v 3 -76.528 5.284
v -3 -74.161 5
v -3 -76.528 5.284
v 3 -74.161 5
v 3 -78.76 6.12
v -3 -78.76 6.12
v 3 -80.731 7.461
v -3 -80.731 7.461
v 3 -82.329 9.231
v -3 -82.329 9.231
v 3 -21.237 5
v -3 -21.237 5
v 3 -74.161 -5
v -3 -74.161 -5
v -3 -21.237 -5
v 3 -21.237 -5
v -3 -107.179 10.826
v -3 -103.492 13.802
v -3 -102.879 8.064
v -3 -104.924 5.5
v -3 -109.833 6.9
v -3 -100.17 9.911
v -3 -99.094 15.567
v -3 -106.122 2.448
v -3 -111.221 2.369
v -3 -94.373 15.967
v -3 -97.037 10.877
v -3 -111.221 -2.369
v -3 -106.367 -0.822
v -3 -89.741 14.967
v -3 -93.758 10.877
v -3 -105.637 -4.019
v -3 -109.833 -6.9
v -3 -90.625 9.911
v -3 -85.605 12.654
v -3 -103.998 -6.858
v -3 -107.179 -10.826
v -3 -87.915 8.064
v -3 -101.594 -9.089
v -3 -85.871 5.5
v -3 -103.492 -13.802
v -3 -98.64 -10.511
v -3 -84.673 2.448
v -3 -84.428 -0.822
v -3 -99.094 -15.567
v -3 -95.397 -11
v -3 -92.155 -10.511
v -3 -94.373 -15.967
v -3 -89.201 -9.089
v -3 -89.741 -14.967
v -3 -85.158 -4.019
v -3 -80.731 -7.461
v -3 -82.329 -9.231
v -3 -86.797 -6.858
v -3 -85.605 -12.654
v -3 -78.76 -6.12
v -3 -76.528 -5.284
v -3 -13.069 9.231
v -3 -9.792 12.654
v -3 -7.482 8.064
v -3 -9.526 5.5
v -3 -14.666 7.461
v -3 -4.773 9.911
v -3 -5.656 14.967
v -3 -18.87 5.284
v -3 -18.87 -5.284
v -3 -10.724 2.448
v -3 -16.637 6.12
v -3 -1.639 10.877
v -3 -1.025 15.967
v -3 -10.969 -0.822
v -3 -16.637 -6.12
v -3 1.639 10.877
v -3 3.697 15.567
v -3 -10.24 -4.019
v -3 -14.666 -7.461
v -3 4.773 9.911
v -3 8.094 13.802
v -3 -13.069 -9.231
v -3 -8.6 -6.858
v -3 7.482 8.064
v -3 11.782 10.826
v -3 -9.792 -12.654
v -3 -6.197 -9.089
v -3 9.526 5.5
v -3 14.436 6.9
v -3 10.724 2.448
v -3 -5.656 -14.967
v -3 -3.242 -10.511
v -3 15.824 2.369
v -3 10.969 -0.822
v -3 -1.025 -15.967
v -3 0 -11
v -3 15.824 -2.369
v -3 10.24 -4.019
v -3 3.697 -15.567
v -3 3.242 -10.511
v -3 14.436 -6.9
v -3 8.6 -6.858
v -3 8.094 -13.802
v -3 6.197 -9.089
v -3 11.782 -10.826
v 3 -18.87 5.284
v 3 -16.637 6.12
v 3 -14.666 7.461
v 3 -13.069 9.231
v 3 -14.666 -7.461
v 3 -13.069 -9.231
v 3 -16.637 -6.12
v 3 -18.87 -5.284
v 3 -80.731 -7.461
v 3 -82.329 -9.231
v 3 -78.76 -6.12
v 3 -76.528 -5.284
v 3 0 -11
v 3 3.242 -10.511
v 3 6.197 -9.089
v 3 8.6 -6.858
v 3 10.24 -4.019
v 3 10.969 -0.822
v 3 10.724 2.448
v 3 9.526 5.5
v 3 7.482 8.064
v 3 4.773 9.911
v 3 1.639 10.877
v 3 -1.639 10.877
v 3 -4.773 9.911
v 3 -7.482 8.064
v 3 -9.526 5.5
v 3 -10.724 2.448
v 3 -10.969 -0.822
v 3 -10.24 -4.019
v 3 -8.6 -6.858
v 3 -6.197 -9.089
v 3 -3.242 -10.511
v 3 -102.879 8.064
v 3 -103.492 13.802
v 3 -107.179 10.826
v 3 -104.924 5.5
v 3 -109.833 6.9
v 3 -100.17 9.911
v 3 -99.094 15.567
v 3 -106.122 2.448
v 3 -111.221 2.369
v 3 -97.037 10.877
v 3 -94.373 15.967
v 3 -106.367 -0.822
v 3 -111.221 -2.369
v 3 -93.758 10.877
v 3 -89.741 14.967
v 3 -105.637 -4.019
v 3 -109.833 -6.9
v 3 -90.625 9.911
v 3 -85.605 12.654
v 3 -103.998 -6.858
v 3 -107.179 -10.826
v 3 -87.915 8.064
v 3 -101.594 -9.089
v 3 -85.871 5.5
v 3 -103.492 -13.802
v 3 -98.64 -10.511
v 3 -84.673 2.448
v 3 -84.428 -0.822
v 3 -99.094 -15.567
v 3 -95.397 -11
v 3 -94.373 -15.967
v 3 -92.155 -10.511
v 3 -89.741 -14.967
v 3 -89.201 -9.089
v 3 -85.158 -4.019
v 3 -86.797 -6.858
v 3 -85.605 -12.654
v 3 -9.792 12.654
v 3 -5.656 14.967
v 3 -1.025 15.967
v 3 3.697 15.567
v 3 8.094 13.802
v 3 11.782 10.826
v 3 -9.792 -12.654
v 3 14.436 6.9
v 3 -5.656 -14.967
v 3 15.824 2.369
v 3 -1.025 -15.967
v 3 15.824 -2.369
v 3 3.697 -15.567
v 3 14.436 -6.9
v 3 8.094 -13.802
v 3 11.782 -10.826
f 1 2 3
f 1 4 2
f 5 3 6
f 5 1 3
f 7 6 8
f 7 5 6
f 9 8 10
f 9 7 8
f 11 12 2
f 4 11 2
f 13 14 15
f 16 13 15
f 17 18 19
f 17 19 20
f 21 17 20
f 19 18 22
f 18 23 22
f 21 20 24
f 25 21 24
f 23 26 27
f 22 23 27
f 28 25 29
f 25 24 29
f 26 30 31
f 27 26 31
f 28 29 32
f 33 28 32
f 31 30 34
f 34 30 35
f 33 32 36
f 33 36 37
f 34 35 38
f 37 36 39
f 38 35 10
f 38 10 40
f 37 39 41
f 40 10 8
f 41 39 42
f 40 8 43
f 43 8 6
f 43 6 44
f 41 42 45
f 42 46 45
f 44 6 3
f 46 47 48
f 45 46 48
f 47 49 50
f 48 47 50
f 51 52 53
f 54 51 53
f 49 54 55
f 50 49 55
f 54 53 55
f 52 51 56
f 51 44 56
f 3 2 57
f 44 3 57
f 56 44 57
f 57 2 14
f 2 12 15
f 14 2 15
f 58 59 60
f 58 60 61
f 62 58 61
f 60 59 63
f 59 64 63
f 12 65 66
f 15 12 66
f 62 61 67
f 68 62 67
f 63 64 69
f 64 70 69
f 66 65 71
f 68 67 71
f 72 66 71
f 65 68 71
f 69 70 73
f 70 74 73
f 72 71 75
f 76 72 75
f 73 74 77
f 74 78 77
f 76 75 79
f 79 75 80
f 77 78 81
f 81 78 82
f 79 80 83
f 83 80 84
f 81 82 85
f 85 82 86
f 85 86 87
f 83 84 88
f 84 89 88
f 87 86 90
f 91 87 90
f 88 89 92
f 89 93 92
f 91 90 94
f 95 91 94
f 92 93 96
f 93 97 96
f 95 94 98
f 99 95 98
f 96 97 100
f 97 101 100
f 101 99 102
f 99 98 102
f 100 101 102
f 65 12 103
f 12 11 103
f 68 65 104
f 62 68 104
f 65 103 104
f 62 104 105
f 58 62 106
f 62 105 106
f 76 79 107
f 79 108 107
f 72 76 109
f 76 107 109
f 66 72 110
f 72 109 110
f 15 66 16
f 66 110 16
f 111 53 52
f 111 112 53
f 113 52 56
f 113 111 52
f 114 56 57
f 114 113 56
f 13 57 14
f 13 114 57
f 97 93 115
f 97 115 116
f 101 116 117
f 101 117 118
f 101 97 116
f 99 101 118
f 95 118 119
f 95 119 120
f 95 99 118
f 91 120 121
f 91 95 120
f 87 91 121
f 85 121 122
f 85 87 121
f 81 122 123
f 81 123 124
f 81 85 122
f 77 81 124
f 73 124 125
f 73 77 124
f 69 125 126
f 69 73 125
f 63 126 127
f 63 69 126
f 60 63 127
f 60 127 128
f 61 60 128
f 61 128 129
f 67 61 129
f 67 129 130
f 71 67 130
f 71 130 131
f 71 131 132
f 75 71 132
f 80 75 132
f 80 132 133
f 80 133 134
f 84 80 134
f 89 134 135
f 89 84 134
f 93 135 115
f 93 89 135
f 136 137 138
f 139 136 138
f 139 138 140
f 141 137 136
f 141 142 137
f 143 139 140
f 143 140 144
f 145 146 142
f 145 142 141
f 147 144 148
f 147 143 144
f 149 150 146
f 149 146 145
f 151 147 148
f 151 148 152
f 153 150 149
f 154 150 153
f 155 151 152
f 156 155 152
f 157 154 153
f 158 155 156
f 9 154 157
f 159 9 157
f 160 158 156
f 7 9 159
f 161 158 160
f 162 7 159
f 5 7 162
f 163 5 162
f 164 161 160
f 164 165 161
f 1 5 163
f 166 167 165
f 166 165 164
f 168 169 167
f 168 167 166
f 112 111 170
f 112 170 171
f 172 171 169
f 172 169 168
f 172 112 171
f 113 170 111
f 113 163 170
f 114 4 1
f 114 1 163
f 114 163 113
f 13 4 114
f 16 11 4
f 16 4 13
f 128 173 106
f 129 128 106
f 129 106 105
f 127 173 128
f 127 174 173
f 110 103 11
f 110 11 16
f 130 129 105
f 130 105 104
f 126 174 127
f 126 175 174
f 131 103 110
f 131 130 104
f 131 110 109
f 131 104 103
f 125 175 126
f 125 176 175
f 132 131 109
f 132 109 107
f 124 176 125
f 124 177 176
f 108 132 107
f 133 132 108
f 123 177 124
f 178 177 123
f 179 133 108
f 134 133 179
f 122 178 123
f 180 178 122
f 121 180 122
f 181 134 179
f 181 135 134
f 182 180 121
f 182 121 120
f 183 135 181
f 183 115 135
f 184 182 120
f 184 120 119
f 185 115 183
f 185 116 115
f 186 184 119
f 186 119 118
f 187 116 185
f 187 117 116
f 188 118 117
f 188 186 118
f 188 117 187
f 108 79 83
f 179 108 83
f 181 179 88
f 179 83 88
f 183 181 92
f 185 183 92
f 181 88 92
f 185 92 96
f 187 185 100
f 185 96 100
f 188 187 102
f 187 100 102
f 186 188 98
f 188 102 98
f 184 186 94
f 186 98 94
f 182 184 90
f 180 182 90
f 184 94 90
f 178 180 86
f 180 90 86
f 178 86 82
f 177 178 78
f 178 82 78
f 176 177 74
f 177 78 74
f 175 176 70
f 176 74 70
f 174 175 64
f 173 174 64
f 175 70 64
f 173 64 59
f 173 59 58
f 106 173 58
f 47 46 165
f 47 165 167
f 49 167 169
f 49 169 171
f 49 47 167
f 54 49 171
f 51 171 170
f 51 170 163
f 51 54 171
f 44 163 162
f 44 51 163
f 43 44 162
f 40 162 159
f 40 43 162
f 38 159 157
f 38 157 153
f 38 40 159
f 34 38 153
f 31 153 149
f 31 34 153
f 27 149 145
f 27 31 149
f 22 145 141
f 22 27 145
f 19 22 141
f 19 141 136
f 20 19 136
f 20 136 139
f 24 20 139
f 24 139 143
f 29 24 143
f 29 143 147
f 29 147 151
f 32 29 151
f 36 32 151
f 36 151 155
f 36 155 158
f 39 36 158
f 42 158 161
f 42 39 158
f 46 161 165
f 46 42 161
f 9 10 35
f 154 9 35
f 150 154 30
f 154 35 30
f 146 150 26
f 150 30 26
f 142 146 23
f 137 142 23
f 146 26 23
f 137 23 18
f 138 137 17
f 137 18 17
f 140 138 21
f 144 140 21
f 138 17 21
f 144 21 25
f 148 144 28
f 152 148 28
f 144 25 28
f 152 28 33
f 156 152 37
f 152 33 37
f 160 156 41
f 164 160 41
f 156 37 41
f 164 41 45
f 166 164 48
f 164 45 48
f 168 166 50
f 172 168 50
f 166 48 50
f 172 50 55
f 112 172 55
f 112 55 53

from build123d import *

# Parameters (mm, degrees)
BOSS_EXTRUDE1_DEPTH      = 3
BOSS_EXTRUDE1_DEPTH_BACK = 3
SKETCH1_R                = 11
FILLET1_R                = 10


with BuildPart() as part:
    # Sketch1 → Boss-Extrude1 (new, two sides: drawn at the far end of the back side and taken through both)
    with BuildSketch(Plane(origin=(0, 0, 0), x_dir=(0, 0, -1), z_dir=(1, 0, 0)).offset(-BOSS_EXTRUDE1_DEPTH_BACK)):
        with BuildLine():
            Line((-5, -15.198684154), (-5, -80.198684154))
            ThreePointArc((-5, -80.198684154), (0, -111.397368307), (5, -80.198684154))
            Line((5, -80.198684154), (5, -15.198684154))
            ThreePointArc((5, -15.198684154), (0, 16), (-5, -15.198684154))
        make_face()
        Circle(SKETCH1_R, mode=Mode.SUBTRACT)
        with Locations((0, -95.397368307)):
            Circle(SKETCH1_R, mode=Mode.SUBTRACT)
    extrude(amount=BOSS_EXTRUDE1_DEPTH + BOSS_EXTRUDE1_DEPTH_BACK)

    # Fillet1
    fillet1_edges = [part.edges().sort_by_distance(p)[0] for p in [
        (0, -15.198684154, -5),
        (0, -80.198684154, -5),
        (0, -80.198684154, 5),
        (0, -15.198684154, 5),
    ]]
    fillet(fillet1_edges, radius=FILLET1_R)


solid = part.part
